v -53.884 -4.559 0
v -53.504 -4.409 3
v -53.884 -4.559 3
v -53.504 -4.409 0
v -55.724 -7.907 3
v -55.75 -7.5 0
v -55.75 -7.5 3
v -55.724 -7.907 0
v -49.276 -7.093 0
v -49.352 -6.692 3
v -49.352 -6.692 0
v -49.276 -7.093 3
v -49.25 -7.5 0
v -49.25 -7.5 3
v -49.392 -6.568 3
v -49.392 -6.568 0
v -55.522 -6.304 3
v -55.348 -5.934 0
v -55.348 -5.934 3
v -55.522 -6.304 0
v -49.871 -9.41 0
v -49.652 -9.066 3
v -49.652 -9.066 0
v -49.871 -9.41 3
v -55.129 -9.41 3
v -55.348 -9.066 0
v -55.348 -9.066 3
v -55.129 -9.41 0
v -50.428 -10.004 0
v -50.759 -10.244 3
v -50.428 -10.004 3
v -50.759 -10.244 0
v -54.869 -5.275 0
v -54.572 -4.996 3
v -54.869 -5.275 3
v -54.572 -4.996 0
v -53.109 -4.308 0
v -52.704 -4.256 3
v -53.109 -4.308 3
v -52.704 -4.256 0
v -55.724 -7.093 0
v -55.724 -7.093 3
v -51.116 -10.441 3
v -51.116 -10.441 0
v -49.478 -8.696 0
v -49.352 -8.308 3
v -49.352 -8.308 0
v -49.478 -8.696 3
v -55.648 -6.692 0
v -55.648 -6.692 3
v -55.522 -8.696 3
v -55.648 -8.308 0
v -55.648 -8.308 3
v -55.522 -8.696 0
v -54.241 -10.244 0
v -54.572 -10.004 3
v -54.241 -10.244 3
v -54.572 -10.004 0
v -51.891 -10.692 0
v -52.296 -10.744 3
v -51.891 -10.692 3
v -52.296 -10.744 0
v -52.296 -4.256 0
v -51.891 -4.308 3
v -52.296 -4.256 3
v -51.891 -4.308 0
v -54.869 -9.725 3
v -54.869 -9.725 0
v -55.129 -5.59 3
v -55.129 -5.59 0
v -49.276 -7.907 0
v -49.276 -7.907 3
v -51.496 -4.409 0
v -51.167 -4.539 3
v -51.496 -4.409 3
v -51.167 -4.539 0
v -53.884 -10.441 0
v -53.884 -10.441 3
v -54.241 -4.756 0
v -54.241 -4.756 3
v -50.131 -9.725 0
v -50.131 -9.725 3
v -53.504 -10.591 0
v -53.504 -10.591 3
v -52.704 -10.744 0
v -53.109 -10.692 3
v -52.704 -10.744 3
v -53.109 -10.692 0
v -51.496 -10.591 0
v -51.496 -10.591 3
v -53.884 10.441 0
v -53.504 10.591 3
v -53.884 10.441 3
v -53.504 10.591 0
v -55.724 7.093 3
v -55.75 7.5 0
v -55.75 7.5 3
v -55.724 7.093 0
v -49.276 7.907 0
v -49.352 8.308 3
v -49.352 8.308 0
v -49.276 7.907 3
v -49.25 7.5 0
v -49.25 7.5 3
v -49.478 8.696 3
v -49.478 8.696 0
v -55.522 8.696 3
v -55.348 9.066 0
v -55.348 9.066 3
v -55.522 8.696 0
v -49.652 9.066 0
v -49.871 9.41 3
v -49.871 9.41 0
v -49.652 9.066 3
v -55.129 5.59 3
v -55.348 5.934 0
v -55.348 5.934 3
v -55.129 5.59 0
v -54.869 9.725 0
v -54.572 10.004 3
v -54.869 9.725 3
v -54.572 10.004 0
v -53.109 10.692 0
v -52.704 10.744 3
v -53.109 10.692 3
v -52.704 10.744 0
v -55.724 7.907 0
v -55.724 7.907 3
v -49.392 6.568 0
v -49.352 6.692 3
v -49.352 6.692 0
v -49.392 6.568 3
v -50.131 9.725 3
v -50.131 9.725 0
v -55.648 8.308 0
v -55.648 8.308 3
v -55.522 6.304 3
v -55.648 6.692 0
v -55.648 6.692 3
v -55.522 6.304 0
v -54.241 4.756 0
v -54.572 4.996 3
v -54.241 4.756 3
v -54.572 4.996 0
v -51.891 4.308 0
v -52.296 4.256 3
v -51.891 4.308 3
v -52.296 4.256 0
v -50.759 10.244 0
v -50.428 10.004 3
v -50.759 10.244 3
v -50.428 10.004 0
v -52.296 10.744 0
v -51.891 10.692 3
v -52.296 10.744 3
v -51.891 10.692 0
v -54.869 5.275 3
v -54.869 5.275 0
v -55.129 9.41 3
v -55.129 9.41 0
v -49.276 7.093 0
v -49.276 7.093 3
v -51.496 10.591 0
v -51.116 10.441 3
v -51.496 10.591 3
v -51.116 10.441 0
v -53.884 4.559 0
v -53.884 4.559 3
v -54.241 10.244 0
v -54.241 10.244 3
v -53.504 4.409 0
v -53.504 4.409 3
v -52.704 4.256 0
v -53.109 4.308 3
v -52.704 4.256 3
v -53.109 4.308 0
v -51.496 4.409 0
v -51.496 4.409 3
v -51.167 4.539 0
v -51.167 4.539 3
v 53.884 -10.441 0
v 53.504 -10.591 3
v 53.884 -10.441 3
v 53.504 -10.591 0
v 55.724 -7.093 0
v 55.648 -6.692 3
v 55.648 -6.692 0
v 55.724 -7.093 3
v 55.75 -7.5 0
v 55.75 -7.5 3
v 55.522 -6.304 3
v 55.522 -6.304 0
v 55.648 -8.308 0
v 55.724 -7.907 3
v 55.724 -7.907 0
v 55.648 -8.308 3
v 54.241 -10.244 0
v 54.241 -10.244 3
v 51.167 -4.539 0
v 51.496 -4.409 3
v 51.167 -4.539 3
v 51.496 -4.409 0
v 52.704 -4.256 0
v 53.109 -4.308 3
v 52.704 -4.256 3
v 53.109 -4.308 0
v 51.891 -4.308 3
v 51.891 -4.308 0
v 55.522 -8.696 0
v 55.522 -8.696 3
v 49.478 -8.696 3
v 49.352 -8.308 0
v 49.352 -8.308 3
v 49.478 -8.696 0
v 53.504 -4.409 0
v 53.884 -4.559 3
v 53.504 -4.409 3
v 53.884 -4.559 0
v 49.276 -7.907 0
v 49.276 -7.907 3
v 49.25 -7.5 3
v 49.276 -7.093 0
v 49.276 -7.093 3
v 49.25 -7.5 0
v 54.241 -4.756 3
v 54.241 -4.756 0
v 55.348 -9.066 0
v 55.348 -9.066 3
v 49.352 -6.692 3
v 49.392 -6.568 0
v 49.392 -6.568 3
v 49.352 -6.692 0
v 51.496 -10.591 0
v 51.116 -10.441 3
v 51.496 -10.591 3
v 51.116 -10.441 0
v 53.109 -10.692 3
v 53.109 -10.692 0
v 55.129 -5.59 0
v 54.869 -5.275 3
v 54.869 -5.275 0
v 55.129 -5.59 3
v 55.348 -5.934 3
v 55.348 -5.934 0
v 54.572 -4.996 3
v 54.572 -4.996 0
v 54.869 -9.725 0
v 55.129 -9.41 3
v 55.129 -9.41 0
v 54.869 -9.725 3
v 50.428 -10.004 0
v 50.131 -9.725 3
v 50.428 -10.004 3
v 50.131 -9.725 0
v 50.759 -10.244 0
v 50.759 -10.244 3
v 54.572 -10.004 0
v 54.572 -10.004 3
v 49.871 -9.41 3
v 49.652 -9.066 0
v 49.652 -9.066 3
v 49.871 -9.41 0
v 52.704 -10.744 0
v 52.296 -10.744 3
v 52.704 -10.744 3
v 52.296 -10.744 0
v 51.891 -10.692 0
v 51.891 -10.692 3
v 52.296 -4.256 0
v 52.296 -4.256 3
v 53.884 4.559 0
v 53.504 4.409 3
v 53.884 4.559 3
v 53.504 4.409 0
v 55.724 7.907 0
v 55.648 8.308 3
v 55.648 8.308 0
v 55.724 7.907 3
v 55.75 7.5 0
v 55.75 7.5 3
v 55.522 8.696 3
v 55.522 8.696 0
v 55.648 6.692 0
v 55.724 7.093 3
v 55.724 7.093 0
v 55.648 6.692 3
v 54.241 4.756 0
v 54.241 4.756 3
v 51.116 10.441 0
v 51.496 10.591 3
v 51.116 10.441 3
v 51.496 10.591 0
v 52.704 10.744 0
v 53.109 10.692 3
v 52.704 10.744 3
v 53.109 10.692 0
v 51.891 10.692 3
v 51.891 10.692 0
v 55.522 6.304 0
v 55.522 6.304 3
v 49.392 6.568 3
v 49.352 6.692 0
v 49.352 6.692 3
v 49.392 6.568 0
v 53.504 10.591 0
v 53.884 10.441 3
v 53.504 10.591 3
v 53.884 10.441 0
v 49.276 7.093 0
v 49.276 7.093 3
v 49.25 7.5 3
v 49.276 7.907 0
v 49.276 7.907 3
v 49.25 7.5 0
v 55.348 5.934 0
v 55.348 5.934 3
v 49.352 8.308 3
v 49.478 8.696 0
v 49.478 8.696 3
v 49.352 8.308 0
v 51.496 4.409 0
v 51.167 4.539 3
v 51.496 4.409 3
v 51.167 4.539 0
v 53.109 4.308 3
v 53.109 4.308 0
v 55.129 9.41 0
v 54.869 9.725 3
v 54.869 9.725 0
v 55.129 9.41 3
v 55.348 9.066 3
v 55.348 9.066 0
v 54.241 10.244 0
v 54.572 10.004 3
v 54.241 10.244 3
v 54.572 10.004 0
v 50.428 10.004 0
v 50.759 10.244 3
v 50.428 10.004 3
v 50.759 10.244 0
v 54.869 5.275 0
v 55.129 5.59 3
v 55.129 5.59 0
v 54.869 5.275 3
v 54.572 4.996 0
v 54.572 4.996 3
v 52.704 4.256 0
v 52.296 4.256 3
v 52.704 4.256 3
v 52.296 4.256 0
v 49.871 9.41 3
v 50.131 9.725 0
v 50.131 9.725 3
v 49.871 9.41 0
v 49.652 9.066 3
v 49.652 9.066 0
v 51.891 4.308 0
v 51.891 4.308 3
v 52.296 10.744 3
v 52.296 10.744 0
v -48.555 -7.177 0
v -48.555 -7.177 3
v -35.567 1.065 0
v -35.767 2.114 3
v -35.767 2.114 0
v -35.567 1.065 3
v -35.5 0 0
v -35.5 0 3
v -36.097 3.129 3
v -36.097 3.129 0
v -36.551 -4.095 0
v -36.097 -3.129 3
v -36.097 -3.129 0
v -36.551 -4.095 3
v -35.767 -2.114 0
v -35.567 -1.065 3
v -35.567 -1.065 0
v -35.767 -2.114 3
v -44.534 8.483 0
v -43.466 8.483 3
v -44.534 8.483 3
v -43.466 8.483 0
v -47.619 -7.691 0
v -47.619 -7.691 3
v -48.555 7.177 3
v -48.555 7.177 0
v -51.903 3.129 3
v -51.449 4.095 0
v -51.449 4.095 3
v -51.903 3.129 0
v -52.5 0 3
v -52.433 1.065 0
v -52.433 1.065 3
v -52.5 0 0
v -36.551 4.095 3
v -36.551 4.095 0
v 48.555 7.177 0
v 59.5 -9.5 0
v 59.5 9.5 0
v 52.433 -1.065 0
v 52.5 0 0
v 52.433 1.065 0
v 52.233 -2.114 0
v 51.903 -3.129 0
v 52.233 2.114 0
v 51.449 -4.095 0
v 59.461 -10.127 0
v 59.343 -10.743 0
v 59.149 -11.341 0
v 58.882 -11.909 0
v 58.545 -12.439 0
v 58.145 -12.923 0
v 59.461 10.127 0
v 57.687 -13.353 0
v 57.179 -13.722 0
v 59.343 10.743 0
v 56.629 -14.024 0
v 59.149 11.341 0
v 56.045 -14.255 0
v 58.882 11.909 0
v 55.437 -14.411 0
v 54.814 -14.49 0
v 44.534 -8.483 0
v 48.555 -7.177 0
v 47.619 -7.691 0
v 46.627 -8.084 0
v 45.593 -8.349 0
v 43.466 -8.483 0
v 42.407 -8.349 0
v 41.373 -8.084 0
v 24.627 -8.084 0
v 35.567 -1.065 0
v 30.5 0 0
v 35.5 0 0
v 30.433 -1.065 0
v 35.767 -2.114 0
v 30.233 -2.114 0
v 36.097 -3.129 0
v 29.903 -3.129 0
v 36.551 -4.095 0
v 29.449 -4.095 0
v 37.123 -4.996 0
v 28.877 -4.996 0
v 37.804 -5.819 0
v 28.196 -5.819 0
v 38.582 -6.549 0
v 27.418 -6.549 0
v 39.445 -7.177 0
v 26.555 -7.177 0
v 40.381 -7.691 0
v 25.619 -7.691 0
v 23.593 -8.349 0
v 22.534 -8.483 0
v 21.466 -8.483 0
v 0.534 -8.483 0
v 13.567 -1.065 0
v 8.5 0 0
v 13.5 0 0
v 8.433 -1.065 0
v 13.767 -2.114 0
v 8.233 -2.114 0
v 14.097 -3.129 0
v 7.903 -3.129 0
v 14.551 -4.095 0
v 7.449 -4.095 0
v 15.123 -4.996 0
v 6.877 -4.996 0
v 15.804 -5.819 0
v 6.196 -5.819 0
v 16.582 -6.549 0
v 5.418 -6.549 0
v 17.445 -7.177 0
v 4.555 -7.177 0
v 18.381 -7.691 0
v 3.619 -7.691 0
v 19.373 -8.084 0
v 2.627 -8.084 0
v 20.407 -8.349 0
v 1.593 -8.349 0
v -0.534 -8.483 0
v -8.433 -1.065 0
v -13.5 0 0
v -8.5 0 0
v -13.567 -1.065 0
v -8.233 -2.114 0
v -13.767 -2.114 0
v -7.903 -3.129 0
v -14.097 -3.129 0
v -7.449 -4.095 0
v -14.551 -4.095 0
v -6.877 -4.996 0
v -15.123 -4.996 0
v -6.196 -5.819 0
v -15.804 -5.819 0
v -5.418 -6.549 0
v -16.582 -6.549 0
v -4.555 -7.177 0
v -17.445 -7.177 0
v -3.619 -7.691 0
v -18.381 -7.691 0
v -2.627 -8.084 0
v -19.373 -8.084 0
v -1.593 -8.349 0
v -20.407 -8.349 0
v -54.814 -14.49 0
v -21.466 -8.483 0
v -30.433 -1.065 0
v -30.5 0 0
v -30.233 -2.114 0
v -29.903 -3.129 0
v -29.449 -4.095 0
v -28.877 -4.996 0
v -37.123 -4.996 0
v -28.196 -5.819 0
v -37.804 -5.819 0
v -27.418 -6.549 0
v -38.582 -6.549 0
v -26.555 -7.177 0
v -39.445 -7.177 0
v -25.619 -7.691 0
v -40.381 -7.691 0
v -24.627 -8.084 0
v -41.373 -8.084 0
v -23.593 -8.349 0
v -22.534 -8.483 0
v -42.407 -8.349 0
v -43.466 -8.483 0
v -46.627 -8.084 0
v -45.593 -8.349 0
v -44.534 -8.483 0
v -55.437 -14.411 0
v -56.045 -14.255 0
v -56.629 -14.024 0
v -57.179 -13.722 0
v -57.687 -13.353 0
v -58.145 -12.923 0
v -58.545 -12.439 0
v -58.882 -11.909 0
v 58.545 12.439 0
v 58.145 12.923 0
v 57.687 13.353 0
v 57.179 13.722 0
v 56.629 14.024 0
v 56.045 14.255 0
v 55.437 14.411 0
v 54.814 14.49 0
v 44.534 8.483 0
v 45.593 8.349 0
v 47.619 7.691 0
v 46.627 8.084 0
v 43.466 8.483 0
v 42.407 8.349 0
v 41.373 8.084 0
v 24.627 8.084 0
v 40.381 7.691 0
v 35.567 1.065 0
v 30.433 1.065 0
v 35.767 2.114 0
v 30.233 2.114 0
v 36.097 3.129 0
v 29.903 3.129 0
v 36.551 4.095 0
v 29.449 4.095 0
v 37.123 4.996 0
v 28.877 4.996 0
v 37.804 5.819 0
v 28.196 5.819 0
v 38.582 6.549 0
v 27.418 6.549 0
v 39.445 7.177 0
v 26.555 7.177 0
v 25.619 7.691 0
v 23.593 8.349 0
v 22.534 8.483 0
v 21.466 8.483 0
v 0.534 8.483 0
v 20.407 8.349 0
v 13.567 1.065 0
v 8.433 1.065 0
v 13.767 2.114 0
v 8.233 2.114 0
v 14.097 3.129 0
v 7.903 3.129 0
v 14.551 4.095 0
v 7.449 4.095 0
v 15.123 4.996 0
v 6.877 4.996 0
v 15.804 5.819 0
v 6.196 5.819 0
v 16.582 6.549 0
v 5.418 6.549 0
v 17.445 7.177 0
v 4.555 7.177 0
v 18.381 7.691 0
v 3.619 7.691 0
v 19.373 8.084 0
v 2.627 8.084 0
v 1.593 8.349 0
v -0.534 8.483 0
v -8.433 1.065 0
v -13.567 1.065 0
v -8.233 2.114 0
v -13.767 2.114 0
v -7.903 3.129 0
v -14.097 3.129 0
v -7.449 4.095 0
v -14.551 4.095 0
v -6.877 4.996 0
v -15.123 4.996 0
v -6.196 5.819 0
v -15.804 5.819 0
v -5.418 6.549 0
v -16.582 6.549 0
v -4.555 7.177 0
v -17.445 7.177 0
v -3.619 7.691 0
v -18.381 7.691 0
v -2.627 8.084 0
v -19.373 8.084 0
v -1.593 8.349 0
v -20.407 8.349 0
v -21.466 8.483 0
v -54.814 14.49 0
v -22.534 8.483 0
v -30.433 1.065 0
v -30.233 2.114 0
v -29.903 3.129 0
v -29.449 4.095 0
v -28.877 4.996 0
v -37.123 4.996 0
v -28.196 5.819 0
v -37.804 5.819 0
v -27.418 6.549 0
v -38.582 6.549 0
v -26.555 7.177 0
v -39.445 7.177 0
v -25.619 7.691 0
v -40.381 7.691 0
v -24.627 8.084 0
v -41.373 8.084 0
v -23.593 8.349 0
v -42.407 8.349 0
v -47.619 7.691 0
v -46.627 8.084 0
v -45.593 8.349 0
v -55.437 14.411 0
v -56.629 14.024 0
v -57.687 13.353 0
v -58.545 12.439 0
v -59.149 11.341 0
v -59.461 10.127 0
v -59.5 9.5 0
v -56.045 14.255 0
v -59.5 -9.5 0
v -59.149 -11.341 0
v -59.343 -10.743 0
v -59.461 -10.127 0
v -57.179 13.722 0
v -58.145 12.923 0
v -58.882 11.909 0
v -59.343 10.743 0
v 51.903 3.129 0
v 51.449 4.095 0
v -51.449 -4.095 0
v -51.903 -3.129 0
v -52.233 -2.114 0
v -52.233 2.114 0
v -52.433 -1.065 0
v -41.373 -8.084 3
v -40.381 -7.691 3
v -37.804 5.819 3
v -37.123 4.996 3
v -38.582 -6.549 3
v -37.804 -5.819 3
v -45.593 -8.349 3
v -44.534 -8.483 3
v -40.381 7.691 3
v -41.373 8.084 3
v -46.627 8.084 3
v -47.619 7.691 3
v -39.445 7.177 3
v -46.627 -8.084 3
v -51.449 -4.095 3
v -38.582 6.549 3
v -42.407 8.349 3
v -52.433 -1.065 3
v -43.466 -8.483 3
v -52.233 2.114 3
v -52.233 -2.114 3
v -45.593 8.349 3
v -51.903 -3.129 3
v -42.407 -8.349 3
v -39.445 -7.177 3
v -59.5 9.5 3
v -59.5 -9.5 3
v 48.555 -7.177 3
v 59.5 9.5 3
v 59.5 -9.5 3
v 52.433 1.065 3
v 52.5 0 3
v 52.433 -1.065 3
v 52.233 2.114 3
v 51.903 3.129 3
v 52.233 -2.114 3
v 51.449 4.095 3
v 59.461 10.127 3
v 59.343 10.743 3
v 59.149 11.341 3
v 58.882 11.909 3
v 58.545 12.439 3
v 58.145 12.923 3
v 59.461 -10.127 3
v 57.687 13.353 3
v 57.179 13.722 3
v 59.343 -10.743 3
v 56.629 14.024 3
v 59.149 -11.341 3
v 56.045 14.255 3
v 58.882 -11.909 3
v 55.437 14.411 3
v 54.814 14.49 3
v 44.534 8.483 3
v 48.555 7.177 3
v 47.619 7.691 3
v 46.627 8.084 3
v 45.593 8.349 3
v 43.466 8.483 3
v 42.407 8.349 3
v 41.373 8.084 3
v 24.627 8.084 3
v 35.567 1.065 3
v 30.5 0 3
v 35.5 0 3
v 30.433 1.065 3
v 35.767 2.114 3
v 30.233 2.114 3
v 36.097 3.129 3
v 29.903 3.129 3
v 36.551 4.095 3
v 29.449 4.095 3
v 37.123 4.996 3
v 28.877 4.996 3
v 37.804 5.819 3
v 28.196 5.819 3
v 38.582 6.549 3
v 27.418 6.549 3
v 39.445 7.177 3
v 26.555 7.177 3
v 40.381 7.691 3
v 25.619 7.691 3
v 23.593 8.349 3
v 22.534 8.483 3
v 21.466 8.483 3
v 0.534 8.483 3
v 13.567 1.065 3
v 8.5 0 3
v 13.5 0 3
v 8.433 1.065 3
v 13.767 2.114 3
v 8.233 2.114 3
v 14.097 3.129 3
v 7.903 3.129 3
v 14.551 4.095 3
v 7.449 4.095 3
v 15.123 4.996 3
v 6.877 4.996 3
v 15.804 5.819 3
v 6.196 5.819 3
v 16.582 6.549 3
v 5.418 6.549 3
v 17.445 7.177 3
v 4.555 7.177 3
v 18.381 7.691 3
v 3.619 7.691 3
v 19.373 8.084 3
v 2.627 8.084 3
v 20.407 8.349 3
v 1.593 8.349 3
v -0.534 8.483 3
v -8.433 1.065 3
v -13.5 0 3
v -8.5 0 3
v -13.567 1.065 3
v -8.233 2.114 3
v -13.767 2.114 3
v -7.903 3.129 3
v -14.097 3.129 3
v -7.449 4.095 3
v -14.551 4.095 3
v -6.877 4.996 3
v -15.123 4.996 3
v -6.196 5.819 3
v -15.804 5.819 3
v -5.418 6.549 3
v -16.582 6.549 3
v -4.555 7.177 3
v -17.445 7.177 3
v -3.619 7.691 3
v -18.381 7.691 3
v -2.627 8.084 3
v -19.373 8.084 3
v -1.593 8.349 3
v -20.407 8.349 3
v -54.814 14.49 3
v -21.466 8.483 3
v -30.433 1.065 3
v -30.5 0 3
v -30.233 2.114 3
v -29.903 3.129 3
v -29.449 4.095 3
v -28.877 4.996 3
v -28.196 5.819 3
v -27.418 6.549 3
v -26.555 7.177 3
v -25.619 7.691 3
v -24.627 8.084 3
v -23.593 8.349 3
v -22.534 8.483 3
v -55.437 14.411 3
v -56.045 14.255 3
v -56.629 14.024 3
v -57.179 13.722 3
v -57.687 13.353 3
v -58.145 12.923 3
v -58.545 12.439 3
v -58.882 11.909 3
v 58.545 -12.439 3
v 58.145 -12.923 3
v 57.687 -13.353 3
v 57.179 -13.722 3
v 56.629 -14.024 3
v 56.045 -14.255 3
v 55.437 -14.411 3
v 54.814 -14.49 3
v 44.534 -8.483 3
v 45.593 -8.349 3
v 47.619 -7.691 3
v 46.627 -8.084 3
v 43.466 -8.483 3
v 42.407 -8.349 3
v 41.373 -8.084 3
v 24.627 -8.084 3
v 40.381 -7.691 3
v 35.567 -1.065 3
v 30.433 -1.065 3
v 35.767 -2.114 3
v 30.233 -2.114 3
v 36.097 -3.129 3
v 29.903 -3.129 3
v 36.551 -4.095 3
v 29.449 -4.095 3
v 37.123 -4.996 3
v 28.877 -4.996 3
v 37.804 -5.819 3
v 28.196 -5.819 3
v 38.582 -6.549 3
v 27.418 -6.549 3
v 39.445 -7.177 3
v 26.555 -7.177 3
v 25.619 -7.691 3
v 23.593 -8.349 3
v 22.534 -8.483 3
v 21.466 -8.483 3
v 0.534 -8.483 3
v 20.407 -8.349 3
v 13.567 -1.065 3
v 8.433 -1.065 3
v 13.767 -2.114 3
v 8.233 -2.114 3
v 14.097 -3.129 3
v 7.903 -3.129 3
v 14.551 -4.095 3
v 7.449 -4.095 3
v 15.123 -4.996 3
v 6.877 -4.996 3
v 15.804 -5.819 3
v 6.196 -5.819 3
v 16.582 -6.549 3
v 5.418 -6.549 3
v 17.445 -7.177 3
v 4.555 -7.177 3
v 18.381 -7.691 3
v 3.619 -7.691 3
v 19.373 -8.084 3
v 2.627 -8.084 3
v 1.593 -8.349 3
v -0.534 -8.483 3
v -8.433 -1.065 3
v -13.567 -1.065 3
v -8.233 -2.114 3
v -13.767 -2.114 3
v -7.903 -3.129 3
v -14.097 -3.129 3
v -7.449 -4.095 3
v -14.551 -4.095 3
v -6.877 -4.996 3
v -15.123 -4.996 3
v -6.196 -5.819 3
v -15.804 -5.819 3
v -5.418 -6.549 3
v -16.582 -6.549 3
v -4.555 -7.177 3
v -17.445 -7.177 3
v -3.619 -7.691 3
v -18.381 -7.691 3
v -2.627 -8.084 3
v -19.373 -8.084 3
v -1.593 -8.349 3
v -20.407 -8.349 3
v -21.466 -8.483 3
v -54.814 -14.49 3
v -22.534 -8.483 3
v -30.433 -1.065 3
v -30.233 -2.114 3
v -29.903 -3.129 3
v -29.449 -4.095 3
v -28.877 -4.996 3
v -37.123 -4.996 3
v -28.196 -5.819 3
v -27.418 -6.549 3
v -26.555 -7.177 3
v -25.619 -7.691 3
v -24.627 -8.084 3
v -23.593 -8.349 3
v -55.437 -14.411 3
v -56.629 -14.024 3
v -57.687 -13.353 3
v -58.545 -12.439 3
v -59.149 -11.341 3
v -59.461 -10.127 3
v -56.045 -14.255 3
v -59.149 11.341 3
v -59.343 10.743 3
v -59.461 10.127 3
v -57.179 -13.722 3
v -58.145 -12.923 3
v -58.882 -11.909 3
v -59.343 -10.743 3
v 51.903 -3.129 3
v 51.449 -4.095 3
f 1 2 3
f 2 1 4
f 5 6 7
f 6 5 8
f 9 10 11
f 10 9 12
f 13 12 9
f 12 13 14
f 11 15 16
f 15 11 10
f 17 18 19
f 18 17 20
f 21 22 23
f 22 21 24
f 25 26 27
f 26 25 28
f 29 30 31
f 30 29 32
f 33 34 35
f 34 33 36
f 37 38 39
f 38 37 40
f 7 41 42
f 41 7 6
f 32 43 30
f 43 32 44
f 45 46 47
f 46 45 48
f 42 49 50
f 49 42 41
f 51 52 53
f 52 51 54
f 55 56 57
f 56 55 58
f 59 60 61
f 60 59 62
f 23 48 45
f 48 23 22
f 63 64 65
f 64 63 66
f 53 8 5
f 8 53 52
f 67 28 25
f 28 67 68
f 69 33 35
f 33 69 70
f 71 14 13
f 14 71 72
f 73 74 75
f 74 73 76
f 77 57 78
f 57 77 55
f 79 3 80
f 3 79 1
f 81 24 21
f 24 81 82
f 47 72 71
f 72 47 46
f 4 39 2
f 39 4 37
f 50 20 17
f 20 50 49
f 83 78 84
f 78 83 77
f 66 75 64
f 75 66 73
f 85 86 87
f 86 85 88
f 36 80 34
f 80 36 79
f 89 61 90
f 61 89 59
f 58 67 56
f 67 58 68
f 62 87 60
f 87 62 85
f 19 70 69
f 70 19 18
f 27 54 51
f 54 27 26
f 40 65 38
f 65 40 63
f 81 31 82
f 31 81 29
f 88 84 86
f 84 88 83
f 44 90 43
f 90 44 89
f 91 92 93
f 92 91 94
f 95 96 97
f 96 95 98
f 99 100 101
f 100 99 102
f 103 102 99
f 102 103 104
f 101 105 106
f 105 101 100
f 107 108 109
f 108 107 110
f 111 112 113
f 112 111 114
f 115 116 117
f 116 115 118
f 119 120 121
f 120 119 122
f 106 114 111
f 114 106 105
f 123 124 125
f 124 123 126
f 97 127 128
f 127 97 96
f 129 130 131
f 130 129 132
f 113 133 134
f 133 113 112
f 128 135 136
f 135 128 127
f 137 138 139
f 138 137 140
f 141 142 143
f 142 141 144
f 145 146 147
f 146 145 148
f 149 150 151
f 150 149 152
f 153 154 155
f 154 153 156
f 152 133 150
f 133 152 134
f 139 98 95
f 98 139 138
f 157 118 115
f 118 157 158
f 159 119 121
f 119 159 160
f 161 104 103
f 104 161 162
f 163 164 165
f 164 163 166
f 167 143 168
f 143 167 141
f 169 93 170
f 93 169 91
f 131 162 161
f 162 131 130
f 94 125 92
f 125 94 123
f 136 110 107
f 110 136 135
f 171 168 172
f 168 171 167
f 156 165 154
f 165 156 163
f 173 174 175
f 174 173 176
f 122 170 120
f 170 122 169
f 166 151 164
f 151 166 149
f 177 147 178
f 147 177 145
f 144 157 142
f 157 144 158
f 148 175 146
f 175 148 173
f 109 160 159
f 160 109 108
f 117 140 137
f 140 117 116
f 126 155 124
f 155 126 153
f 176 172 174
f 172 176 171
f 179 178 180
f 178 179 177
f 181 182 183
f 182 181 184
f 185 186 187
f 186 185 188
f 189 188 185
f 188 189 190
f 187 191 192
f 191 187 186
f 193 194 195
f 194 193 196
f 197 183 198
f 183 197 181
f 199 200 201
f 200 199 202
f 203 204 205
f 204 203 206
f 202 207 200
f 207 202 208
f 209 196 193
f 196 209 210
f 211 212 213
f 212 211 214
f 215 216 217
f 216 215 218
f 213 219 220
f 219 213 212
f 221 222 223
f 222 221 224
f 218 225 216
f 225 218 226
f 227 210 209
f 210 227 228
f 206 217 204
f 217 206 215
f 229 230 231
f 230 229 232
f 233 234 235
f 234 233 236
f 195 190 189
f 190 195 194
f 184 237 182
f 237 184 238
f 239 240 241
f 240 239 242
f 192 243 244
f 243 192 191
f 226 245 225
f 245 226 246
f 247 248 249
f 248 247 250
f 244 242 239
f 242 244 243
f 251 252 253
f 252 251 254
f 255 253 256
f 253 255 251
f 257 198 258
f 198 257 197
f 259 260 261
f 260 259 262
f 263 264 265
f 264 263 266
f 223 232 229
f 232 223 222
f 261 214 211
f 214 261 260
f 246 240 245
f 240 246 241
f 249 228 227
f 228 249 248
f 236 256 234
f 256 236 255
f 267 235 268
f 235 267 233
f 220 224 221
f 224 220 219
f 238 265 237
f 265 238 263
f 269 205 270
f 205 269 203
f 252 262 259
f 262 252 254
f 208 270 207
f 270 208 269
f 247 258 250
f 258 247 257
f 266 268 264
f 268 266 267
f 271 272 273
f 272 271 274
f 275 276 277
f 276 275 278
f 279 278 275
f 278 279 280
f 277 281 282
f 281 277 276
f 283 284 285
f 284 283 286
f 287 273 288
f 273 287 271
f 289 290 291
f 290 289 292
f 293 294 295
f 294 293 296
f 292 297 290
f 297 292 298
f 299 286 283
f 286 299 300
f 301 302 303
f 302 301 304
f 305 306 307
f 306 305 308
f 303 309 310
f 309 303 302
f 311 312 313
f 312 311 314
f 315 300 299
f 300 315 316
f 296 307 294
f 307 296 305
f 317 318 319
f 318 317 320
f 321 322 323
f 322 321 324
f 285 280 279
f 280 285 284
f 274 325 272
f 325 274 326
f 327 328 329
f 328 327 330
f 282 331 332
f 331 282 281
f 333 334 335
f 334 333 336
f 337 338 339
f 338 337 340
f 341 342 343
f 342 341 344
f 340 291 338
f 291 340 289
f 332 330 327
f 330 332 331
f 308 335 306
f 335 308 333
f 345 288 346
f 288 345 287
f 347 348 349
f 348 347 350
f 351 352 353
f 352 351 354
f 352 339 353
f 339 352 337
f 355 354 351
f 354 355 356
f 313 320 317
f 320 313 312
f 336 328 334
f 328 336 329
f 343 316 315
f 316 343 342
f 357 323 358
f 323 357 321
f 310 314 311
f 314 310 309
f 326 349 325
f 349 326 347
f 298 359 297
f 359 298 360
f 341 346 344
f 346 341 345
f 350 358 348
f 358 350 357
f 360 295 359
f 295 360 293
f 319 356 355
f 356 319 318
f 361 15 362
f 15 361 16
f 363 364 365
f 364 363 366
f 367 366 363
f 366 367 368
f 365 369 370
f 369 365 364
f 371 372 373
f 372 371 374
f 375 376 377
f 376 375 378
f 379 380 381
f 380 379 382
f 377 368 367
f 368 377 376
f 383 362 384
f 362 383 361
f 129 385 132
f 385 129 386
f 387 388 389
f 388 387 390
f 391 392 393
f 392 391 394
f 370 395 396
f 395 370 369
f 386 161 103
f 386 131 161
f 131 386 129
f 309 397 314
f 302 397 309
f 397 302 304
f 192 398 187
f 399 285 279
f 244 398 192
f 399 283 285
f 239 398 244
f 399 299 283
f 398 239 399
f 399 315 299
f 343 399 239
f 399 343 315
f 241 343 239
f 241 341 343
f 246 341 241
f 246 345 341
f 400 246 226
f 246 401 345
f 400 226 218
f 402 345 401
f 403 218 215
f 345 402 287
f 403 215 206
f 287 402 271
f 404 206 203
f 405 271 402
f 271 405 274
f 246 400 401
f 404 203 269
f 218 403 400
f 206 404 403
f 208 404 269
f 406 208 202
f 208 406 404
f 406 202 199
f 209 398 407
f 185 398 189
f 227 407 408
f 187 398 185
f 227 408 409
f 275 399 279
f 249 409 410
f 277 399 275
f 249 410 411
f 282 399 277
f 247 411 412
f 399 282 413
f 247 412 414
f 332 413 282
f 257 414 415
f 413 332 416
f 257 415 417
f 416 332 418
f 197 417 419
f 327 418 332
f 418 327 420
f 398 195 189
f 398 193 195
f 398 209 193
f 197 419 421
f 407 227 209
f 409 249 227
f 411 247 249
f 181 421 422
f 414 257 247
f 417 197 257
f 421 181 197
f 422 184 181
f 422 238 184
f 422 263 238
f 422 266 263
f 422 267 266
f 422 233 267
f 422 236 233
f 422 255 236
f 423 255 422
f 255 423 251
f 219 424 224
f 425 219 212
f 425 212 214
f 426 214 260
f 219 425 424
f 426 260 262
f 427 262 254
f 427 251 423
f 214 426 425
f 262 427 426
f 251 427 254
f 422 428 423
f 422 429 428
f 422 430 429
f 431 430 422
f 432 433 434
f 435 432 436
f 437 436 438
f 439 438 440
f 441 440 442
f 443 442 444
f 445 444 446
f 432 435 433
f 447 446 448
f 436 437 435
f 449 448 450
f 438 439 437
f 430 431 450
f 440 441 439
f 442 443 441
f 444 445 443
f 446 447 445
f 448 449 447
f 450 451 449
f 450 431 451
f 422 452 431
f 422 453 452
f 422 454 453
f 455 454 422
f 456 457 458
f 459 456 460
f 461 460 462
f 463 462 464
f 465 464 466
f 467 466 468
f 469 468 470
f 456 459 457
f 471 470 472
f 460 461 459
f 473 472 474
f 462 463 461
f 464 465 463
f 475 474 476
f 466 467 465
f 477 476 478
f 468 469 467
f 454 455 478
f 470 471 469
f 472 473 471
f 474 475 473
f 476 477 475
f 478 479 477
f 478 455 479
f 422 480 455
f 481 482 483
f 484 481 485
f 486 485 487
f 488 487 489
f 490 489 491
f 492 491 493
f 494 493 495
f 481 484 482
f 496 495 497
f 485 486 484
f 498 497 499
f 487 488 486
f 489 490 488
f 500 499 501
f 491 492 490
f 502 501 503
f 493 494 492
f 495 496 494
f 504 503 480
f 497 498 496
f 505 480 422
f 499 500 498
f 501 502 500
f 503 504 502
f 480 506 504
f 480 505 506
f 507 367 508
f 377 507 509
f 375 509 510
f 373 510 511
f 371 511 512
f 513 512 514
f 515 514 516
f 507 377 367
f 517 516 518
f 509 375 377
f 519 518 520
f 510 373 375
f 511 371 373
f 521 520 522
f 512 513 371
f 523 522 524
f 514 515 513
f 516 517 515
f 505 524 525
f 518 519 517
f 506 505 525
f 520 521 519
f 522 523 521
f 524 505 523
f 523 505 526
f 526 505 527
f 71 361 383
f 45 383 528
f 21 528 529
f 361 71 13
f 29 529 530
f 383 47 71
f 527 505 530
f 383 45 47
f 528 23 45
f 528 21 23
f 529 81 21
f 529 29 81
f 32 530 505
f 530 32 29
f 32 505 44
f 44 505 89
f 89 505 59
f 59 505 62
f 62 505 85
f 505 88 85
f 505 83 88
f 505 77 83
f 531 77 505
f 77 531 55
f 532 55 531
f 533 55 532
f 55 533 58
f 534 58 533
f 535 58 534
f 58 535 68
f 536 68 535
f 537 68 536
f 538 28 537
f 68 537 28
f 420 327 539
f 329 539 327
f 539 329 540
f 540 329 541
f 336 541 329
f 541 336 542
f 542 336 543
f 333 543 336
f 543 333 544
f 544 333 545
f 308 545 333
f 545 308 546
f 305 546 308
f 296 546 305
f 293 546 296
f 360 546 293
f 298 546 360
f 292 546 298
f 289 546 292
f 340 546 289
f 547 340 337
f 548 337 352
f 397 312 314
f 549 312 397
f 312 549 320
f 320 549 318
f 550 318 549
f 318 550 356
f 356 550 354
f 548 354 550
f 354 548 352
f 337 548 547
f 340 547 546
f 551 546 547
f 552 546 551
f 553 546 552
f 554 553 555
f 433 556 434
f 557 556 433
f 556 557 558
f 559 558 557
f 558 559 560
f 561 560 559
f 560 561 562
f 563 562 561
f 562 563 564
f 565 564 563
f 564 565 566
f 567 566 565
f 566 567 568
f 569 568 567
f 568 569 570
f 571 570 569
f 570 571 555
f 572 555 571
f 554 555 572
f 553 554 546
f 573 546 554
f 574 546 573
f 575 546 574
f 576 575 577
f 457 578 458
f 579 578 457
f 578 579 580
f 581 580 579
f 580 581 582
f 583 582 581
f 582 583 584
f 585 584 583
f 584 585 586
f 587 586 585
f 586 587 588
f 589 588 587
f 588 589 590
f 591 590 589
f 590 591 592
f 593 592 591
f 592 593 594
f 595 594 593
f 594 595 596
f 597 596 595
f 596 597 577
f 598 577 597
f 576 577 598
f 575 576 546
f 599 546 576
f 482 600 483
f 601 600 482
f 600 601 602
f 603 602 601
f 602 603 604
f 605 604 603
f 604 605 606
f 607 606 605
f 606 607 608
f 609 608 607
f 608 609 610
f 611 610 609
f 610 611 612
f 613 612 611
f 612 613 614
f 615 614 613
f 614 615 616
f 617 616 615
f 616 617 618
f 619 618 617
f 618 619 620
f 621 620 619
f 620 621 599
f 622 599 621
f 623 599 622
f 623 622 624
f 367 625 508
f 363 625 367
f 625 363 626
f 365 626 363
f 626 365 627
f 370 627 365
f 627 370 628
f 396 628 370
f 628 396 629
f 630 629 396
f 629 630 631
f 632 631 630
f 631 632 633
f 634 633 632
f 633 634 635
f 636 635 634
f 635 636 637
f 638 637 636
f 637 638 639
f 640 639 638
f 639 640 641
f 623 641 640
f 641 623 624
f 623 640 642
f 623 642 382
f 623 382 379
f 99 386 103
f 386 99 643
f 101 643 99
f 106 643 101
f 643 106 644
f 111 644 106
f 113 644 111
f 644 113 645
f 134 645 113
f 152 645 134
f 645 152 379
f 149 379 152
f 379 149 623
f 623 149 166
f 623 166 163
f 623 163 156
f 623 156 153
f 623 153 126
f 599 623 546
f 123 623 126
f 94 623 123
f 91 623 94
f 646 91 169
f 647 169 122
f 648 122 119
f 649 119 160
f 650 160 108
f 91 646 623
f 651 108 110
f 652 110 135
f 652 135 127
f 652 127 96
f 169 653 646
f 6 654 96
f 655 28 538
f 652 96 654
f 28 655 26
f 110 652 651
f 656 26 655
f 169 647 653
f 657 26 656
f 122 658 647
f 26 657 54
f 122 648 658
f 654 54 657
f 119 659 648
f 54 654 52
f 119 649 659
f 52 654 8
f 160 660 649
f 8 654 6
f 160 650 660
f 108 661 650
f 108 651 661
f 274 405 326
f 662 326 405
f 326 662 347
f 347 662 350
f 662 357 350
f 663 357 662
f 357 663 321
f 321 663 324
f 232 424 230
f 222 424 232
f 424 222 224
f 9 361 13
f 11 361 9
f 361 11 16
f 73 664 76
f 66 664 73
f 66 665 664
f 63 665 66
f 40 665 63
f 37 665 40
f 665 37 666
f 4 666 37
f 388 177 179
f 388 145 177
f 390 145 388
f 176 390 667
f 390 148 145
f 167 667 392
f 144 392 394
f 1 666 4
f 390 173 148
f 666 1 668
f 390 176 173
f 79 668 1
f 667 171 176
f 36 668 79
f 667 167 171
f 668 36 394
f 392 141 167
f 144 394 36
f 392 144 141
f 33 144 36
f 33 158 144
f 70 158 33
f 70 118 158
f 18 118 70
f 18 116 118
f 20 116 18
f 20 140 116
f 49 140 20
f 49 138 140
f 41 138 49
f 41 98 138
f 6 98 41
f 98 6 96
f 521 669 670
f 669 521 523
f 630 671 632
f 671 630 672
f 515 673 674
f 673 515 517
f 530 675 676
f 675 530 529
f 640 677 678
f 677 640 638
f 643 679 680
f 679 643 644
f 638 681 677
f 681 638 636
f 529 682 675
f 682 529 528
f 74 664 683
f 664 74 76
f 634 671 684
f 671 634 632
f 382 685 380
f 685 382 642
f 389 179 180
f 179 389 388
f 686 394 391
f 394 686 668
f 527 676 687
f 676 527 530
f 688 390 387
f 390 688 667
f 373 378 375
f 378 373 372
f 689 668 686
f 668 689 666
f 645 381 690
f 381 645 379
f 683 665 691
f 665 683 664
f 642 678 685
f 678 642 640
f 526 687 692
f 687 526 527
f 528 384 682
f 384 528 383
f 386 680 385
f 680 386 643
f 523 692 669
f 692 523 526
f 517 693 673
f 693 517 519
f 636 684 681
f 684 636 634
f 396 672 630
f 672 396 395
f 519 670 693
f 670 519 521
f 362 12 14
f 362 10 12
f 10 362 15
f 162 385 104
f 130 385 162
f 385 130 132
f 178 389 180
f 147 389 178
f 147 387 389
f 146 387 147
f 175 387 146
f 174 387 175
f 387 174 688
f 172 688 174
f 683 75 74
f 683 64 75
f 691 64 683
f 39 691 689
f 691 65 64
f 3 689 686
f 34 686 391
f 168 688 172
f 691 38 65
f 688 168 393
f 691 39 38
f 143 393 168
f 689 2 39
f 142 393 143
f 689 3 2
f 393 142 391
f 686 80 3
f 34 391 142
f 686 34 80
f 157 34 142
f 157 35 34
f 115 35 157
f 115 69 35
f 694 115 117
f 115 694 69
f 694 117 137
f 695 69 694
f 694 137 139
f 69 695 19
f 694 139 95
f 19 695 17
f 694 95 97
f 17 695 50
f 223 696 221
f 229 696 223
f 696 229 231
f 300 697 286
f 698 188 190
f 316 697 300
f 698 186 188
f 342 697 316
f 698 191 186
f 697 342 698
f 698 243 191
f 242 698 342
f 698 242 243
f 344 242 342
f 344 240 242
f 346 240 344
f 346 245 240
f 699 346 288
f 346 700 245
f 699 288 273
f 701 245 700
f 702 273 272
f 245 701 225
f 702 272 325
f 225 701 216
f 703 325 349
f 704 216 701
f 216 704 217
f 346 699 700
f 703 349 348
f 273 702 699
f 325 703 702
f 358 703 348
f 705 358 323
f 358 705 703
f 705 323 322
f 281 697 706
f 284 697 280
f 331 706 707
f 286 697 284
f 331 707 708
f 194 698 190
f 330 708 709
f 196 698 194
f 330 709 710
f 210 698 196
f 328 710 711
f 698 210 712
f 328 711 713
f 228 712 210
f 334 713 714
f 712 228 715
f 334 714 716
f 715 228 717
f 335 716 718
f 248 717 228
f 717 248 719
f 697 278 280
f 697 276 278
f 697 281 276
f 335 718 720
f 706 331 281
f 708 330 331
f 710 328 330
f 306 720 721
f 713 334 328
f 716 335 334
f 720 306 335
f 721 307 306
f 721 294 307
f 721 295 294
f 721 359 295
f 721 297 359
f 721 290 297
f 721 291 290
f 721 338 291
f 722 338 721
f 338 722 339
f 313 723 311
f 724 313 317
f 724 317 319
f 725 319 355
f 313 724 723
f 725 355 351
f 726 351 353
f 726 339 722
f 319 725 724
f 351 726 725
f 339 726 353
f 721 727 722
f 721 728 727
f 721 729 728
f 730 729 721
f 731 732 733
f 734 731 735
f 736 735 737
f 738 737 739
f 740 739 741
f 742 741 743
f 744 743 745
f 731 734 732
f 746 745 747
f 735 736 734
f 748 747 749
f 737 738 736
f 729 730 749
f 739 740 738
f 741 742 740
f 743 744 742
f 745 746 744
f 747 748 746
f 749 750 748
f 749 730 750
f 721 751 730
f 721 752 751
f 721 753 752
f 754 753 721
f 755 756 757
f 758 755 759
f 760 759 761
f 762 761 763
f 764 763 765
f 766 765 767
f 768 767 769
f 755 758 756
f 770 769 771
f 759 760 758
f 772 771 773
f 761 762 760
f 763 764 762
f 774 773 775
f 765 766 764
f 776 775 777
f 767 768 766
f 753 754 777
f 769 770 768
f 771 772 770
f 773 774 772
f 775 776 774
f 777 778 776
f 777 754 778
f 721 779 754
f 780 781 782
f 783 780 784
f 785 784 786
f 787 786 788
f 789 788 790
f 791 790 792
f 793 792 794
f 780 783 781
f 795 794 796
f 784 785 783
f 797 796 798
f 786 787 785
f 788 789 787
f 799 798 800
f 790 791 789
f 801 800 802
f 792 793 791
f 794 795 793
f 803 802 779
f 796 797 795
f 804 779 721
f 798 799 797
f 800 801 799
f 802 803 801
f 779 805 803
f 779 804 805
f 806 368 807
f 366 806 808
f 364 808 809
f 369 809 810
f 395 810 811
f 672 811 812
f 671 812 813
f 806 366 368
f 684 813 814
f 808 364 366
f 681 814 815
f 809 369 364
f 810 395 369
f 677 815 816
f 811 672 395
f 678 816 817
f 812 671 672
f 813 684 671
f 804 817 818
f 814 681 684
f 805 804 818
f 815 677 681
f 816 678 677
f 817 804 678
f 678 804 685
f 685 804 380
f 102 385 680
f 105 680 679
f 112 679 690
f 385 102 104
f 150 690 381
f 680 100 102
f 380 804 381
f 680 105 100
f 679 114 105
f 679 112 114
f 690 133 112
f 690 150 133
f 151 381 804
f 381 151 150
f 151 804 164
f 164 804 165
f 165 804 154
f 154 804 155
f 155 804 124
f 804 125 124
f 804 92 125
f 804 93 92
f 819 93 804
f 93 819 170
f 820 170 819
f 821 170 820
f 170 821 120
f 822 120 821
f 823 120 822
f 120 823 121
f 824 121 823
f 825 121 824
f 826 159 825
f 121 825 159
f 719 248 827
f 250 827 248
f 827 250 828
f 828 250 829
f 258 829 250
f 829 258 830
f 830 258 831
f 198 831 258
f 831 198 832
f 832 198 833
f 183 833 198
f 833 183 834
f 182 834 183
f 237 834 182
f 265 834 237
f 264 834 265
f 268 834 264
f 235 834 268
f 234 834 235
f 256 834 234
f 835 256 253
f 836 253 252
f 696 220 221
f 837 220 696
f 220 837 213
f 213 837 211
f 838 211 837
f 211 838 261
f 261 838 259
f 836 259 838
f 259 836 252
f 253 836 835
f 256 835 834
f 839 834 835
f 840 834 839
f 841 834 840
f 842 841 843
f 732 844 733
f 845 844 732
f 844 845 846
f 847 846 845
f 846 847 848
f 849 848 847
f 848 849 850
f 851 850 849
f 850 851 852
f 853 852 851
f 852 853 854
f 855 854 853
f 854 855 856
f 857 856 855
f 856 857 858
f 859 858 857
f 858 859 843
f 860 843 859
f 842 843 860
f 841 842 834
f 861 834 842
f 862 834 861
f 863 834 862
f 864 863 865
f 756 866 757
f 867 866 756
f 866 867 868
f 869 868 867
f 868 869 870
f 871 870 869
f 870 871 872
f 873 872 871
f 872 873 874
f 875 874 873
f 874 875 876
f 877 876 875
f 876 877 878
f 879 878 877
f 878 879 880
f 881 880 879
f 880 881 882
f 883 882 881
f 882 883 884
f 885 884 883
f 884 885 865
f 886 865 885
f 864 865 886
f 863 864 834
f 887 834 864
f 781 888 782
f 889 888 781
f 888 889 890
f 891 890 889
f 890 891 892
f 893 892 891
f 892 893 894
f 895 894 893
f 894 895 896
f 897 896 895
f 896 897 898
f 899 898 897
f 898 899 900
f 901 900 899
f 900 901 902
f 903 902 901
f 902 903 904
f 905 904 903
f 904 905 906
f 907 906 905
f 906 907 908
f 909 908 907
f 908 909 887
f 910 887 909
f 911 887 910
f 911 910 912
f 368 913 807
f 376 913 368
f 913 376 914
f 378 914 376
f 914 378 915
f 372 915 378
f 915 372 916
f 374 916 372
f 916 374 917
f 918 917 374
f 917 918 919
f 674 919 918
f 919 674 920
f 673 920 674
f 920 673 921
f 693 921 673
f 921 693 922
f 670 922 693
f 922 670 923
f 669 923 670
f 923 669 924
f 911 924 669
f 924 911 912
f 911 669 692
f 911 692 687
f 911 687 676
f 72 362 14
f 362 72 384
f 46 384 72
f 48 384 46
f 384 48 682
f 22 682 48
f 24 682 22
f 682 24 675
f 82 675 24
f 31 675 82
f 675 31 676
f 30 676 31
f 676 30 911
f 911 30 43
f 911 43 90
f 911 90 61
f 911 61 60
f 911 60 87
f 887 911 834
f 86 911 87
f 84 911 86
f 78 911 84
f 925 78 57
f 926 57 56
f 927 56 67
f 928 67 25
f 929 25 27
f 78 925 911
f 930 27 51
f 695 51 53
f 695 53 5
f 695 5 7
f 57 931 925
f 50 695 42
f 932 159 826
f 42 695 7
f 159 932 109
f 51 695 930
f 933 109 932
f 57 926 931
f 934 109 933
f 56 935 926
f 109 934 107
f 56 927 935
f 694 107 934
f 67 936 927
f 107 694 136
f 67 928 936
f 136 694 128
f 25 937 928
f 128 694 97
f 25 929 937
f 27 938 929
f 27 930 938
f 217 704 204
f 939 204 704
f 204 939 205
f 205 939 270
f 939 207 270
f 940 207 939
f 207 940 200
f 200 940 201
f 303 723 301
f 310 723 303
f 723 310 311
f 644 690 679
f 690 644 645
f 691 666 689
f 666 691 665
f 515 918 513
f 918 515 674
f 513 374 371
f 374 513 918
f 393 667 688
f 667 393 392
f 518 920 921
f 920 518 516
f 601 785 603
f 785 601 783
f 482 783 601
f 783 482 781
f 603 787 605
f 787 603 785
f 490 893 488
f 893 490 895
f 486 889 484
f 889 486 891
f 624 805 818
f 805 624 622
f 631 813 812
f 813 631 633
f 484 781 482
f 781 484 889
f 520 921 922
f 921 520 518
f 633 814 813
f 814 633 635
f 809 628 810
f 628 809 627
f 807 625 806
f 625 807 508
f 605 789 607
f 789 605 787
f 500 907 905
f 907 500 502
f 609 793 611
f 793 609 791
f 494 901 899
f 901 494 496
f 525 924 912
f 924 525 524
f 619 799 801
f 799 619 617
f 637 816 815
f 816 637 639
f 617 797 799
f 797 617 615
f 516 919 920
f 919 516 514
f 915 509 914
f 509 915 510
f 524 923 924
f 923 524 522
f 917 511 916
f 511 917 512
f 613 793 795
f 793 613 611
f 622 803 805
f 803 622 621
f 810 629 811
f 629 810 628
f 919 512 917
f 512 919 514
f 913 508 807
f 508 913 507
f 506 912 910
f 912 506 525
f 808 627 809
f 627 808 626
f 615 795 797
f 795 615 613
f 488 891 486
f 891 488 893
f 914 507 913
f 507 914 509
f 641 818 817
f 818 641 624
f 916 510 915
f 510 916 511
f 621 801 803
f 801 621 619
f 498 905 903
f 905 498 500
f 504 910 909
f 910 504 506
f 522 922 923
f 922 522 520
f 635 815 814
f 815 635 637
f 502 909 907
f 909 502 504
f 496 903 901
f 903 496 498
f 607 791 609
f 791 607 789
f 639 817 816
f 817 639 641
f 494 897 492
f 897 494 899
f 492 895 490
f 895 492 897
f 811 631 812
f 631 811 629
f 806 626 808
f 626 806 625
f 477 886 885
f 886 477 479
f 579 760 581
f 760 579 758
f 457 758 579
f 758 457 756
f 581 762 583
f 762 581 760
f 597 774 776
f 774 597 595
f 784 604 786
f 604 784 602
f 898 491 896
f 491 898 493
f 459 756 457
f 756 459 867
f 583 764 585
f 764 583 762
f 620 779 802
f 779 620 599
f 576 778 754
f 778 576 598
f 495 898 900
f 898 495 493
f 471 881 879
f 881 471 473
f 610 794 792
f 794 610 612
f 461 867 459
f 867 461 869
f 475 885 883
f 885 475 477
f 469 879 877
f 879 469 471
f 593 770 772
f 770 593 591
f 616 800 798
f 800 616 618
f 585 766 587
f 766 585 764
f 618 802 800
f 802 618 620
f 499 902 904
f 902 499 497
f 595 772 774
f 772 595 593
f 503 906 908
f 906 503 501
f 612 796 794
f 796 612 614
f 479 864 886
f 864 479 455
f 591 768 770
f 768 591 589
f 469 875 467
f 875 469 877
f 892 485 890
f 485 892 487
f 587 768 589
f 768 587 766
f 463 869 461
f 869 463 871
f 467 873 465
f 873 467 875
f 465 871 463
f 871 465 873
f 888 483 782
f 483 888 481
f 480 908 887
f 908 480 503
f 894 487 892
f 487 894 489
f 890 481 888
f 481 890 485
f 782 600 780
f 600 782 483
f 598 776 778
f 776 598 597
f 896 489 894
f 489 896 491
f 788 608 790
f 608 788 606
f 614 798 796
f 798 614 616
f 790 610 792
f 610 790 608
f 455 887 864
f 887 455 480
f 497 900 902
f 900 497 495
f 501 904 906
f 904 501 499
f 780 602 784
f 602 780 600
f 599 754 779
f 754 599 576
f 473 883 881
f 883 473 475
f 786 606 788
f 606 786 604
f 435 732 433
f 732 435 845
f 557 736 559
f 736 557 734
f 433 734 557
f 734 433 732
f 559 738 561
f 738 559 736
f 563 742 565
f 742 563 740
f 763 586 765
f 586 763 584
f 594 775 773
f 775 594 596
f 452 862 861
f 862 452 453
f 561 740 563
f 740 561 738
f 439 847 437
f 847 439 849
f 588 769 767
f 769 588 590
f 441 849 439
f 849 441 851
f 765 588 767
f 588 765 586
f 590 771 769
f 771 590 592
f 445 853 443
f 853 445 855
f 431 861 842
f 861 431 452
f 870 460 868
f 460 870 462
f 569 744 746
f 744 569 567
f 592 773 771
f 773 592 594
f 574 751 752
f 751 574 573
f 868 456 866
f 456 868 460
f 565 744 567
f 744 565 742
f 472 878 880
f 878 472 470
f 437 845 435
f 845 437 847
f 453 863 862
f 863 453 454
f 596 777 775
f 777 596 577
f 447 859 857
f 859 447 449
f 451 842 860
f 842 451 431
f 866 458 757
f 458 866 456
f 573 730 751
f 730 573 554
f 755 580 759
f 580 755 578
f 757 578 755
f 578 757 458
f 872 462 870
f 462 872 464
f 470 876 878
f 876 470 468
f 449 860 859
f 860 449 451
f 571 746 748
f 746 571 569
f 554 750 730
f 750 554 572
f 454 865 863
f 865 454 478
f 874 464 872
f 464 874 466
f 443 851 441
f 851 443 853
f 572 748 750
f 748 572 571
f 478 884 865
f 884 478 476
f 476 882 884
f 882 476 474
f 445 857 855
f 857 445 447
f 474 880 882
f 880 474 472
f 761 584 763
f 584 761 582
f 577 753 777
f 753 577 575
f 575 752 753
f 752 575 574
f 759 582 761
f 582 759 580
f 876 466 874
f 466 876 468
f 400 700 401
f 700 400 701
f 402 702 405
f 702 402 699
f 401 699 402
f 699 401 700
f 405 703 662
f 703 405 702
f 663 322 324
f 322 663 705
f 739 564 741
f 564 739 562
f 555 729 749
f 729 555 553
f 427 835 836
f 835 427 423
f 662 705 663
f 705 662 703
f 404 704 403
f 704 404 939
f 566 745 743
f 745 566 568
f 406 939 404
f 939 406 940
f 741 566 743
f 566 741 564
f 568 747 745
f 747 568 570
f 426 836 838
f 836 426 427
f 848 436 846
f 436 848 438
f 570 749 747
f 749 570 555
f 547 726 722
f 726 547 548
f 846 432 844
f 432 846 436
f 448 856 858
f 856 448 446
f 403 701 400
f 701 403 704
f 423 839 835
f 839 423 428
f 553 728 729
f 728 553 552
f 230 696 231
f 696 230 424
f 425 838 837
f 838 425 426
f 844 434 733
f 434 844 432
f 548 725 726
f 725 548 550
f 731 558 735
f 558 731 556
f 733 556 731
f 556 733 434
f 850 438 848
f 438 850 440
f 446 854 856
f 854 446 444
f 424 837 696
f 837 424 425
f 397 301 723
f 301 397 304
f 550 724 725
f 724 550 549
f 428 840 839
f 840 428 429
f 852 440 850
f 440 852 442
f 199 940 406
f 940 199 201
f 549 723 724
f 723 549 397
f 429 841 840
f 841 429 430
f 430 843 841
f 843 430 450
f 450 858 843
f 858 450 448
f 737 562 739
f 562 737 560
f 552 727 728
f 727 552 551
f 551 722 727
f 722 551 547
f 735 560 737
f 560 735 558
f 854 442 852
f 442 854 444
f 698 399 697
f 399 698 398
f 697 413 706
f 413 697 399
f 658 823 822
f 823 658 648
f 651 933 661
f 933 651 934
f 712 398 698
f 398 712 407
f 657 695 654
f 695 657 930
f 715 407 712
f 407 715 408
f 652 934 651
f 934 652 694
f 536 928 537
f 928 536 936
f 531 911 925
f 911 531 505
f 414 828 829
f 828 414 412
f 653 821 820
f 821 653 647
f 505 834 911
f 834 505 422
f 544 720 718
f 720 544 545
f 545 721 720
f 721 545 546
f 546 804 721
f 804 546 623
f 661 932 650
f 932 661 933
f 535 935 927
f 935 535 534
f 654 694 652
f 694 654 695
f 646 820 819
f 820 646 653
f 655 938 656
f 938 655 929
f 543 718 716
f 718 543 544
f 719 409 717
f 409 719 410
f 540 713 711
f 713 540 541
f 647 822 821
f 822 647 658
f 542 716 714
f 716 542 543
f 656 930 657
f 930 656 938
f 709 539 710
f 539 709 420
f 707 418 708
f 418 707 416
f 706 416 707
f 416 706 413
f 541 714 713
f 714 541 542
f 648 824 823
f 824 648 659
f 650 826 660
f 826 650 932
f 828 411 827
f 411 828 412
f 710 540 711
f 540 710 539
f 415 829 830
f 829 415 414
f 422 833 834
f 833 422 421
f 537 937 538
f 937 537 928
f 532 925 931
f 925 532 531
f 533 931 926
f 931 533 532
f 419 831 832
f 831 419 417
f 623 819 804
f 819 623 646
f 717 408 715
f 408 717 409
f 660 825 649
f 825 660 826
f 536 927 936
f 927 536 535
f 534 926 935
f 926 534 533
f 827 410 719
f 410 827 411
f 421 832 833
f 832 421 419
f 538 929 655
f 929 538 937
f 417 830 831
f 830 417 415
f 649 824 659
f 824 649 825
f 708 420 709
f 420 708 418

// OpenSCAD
$fn = 50;


difference() {
	union() {
		hull() {
			translate(v = [-54.5000000000, 9.5000000000, 0]) {
				cylinder(h = 3, r = 5);
			}
			translate(v = [54.5000000000, 9.5000000000, 0]) {
				cylinder(h = 3, r = 5);
			}
			translate(v = [-54.5000000000, -9.5000000000, 0]) {
				cylinder(h = 3, r = 5);
			}
			translate(v = [54.5000000000, -9.5000000000, 0]) {
				cylinder(h = 3, r = 5);
			}
		}
	}
	union() {
		#translate(v = [-52.5000000000, -7.5000000000, -100.0000000000]) {
			cylinder(h = 200, r = 3.2500000000);
		}
		#translate(v = [-52.5000000000, 7.5000000000, -100.0000000000]) {
			cylinder(h = 200, r = 3.2500000000);
		}
		#translate(v = [52.5000000000, -7.5000000000, -100.0000000000]) {
			cylinder(h = 200, r = 3.2500000000);
		}
		#translate(v = [52.5000000000, 7.5000000000, -100.0000000000]) {
			cylinder(h = 200, r = 3.2500000000);
		}
		#translate(v = [-44.0000000000, 0, 0]) {
			cylinder(h = 3, r = 8.5000000000);
		}
		#translate(v = [-22.0000000000, 0, 0]) {
			cylinder(h = 3, r = 8.5000000000);
		}
		#cylinder(h = 3, r = 8.5000000000);
		#translate(v = [22.0000000000, 0, 0]) {
			cylinder(h = 3, r = 8.5000000000);
		}
		#translate(v = [44.0000000000, 0, 0]) {
			cylinder(h = 3, r = 8.5000000000);
		}
	}
}
